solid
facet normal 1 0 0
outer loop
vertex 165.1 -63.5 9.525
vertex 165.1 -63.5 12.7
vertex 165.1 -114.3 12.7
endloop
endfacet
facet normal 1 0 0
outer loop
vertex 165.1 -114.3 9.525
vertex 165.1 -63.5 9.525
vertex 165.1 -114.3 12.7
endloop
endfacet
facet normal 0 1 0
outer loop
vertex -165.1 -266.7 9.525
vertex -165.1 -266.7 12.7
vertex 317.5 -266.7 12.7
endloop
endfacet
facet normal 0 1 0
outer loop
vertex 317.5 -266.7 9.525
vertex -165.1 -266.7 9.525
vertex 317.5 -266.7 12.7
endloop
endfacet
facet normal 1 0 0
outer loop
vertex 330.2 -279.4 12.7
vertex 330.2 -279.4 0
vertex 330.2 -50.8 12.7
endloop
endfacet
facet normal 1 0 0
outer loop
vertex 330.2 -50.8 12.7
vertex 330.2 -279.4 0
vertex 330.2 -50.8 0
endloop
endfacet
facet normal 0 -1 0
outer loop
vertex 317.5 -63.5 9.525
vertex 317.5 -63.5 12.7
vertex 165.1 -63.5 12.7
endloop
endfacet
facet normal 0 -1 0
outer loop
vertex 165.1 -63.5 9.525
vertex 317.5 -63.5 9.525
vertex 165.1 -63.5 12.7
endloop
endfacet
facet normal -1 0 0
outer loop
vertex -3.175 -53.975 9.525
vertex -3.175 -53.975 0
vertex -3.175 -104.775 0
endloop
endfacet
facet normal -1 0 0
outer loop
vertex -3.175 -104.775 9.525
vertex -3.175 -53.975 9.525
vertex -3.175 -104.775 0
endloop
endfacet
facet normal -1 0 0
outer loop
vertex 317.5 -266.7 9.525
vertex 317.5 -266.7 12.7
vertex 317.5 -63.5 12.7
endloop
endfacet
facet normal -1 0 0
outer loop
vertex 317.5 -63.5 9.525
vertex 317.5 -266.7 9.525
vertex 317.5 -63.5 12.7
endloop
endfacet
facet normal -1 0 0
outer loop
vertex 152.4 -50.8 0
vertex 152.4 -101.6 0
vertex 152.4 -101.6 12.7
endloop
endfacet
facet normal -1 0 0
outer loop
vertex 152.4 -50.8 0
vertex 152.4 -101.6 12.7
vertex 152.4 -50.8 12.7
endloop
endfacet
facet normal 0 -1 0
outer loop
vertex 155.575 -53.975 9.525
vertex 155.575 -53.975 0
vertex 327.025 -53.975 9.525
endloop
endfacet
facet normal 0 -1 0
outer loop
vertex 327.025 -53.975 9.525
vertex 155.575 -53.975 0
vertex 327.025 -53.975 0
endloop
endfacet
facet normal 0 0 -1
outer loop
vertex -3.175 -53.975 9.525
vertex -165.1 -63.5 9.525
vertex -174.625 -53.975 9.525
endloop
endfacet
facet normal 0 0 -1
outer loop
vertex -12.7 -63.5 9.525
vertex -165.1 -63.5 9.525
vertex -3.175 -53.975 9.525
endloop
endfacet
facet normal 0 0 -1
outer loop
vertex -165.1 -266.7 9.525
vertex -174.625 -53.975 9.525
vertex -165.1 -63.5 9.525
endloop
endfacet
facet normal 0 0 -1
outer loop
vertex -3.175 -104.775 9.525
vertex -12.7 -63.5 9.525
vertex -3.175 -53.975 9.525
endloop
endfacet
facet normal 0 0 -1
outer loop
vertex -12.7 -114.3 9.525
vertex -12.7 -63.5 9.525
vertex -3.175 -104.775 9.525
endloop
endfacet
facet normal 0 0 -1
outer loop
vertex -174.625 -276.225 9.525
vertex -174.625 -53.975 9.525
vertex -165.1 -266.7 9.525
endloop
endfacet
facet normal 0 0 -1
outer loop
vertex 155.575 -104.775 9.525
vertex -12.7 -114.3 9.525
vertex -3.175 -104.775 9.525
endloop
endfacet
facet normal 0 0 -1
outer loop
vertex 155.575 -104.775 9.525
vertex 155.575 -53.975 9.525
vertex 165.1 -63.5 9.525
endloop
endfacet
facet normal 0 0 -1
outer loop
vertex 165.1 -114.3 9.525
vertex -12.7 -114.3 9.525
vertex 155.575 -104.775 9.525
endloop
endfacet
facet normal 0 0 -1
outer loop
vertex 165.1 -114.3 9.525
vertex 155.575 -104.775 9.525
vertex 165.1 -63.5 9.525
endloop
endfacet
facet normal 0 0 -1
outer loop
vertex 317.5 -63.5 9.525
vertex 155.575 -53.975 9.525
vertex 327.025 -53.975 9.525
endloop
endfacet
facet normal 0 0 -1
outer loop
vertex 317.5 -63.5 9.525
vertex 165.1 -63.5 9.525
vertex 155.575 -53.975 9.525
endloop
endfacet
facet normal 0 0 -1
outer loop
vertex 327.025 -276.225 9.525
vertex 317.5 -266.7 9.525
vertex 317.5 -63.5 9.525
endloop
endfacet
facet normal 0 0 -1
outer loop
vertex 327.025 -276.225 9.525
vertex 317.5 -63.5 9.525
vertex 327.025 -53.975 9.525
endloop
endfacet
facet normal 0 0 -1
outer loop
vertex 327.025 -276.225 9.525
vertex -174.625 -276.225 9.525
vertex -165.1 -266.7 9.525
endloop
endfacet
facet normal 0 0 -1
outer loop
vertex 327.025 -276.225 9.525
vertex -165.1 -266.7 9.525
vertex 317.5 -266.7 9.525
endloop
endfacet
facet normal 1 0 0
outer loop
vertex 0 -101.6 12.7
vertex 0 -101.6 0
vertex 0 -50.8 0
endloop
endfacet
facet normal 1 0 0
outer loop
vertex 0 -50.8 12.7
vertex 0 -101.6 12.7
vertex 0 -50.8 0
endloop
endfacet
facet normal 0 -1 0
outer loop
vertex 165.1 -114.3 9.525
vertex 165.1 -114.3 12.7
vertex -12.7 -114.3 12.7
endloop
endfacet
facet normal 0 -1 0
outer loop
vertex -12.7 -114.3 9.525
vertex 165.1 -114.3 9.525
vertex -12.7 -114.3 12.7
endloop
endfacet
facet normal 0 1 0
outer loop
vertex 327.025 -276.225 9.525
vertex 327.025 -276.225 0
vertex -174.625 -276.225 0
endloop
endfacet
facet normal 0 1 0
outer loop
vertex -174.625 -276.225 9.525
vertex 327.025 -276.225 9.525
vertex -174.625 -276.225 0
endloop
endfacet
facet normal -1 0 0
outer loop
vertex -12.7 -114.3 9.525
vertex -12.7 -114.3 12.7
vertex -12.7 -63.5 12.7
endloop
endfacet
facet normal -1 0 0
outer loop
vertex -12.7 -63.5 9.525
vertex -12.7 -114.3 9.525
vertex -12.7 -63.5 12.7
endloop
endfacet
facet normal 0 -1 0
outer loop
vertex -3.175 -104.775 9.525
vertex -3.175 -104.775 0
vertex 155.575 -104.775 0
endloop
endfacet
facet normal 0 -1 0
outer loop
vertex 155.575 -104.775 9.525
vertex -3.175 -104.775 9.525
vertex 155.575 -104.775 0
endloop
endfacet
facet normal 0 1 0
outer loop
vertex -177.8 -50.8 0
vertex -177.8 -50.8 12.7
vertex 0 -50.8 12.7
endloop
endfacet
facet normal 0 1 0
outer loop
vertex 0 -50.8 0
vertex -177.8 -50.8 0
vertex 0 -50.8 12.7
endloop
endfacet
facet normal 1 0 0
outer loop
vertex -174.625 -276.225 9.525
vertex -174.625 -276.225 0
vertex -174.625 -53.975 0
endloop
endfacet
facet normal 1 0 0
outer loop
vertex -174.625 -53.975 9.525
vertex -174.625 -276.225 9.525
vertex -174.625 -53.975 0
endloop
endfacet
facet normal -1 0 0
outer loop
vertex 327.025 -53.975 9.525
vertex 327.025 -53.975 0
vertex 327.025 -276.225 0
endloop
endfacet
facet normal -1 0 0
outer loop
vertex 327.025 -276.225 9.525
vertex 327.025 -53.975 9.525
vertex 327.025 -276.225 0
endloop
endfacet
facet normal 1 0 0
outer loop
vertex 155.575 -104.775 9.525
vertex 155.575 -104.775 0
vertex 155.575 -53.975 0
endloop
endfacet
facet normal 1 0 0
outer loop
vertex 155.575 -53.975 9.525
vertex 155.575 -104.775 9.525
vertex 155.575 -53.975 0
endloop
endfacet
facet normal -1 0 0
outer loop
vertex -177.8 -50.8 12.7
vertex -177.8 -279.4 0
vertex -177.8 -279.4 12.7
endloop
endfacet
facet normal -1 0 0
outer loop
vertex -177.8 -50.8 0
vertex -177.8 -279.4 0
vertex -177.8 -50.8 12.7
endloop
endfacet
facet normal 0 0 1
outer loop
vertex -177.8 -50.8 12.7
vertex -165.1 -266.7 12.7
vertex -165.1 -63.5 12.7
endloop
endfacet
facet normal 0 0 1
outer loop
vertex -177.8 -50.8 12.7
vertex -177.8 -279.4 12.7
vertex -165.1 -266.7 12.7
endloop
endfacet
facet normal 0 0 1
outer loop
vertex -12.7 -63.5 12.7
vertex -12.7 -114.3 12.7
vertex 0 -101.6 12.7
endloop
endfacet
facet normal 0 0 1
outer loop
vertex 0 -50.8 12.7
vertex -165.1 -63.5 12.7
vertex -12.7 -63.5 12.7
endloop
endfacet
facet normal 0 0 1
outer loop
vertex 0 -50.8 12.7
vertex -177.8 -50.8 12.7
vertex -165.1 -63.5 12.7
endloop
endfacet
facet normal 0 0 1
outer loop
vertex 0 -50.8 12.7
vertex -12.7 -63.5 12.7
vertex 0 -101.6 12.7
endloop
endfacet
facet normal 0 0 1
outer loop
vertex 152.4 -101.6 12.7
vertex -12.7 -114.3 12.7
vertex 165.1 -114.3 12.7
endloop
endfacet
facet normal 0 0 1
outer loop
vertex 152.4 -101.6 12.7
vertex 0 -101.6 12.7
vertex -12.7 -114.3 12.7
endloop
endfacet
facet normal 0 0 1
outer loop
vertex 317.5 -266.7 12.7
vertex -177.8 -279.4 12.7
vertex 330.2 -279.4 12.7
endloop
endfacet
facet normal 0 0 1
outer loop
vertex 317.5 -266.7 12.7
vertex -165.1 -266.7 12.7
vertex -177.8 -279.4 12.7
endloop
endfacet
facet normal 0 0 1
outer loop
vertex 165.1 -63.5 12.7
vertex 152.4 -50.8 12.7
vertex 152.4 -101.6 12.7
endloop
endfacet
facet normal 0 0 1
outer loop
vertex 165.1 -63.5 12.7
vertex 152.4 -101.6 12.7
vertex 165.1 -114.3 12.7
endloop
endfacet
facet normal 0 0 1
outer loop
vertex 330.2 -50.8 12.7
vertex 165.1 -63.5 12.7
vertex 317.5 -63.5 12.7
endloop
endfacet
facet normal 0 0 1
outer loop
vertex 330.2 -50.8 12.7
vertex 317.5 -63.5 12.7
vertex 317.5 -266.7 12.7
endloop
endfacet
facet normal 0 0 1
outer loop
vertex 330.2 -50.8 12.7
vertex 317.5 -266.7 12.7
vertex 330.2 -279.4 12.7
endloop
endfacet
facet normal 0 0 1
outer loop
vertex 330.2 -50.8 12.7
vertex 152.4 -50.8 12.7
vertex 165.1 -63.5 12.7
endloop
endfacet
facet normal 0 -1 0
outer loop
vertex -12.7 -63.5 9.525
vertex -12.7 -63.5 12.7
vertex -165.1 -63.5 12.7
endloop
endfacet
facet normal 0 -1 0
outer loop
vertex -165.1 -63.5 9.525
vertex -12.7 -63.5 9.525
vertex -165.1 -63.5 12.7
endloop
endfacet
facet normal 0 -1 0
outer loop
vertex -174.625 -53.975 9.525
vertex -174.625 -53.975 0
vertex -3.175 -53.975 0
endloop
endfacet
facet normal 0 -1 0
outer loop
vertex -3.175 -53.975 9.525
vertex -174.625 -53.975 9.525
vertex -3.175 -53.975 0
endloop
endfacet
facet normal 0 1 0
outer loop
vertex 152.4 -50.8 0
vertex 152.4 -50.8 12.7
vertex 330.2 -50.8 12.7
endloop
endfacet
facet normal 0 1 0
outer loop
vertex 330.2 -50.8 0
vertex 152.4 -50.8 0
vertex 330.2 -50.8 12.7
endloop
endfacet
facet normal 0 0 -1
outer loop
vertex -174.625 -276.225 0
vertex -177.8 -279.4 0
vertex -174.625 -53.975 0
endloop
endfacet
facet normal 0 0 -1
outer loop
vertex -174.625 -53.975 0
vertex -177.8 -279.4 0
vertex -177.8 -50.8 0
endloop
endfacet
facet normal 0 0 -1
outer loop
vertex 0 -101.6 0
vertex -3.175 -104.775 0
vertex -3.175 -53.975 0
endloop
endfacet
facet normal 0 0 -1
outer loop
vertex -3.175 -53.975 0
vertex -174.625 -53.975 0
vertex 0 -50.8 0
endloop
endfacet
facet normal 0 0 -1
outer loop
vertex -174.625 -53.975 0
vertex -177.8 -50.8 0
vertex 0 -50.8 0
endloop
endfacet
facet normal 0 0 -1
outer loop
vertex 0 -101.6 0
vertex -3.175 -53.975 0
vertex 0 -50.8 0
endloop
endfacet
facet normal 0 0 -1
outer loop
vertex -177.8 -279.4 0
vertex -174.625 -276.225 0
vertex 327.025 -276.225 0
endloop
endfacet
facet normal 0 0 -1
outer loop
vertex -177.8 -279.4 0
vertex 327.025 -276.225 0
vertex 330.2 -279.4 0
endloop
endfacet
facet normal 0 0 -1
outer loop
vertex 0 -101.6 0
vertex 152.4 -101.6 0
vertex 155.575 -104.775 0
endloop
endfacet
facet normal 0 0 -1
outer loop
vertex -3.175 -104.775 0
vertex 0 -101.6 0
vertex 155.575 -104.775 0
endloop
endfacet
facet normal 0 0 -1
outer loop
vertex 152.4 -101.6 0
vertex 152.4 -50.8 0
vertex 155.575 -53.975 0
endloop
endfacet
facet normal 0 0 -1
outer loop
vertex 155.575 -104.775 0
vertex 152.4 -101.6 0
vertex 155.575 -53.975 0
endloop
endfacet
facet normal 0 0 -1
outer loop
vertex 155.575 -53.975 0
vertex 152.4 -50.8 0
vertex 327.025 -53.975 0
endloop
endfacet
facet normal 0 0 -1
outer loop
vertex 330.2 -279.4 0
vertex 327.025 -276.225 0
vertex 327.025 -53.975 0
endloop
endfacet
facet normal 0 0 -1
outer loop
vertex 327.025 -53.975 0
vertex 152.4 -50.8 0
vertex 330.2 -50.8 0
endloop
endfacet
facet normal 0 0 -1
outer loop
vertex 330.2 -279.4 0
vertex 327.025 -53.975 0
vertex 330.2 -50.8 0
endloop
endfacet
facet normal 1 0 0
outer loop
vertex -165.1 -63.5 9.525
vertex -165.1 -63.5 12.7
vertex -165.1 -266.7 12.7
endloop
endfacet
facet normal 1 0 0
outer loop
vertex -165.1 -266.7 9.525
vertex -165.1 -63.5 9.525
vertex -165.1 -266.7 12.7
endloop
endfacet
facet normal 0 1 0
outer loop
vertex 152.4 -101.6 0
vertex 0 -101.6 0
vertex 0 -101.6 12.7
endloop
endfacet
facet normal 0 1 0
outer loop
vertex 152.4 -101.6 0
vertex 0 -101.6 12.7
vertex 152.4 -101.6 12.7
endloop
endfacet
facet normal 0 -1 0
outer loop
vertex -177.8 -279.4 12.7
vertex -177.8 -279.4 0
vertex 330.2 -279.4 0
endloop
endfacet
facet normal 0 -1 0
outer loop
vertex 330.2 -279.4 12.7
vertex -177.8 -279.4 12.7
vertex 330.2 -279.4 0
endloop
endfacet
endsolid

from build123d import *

# Parameters (mm, degrees)
F0_W     = 508
F0_H     = 457.2
F0_W_2   = 152.4
F0_H_2   = 101.6
F1_DEPTH = 12.7
F2_W     = 508
F2_H     = 228.6
F3_DEPTH = 12.701
F5_DEPTH = 12.701
F7_DEPTH = 9.525


with BuildPart() as f1:
    # F0 (on Top) → F1 (new body)
    with BuildSketch(Plane.XY):
        with Locations((76.2, -50.8)):
            Rectangle(F0_W, F0_H)
        with Locations((76.2, -50.8)):
            Rectangle(F0_W_2, F0_H_2, mode=Mode.SUBTRACT)
    extrude(amount=F1_DEPTH)

    # F2 (on face) → F3 (cut, through all)
    with BuildSketch(Plane.XY.offset(12.7)):
        with Locations((76.2, 63.5)):
            Rectangle(F2_W, F2_H)
    extrude(amount=-F3_DEPTH, mode=Mode.SUBTRACT)

    # F4 (on face) → F5 (cut, through all)
    with BuildSketch(Plane.XY.offset(12.7)):
        Polygon((-12.7, -63.5), (-165.1, -63.5), (-165.1, -266.7), (317.5, -266.7), (317.5, -63.5), (165.1, -63.5), (165.1, -114.3), (-12.7, -114.3), align=None)
    extrude(amount=-F5_DEPTH, mode=Mode.SUBTRACT)

    # F6 (on face) → F7 (cut)
    with BuildSketch(Plane(origin=(0, 0, 0), x_dir=(1, 0, 0), z_dir=(0, 0, -1))):
        Polygon((-174.625, 276.225), (-174.625, 53.975), (-3.175, 53.975), (-3.175, 104.775), (155.575, 104.775), (155.575, 53.975), (327.025, 53.975), (327.025, 276.225), align=None)
    extrude(amount=-F7_DEPTH, mode=Mode.SUBTRACT)


solid = f1.part
